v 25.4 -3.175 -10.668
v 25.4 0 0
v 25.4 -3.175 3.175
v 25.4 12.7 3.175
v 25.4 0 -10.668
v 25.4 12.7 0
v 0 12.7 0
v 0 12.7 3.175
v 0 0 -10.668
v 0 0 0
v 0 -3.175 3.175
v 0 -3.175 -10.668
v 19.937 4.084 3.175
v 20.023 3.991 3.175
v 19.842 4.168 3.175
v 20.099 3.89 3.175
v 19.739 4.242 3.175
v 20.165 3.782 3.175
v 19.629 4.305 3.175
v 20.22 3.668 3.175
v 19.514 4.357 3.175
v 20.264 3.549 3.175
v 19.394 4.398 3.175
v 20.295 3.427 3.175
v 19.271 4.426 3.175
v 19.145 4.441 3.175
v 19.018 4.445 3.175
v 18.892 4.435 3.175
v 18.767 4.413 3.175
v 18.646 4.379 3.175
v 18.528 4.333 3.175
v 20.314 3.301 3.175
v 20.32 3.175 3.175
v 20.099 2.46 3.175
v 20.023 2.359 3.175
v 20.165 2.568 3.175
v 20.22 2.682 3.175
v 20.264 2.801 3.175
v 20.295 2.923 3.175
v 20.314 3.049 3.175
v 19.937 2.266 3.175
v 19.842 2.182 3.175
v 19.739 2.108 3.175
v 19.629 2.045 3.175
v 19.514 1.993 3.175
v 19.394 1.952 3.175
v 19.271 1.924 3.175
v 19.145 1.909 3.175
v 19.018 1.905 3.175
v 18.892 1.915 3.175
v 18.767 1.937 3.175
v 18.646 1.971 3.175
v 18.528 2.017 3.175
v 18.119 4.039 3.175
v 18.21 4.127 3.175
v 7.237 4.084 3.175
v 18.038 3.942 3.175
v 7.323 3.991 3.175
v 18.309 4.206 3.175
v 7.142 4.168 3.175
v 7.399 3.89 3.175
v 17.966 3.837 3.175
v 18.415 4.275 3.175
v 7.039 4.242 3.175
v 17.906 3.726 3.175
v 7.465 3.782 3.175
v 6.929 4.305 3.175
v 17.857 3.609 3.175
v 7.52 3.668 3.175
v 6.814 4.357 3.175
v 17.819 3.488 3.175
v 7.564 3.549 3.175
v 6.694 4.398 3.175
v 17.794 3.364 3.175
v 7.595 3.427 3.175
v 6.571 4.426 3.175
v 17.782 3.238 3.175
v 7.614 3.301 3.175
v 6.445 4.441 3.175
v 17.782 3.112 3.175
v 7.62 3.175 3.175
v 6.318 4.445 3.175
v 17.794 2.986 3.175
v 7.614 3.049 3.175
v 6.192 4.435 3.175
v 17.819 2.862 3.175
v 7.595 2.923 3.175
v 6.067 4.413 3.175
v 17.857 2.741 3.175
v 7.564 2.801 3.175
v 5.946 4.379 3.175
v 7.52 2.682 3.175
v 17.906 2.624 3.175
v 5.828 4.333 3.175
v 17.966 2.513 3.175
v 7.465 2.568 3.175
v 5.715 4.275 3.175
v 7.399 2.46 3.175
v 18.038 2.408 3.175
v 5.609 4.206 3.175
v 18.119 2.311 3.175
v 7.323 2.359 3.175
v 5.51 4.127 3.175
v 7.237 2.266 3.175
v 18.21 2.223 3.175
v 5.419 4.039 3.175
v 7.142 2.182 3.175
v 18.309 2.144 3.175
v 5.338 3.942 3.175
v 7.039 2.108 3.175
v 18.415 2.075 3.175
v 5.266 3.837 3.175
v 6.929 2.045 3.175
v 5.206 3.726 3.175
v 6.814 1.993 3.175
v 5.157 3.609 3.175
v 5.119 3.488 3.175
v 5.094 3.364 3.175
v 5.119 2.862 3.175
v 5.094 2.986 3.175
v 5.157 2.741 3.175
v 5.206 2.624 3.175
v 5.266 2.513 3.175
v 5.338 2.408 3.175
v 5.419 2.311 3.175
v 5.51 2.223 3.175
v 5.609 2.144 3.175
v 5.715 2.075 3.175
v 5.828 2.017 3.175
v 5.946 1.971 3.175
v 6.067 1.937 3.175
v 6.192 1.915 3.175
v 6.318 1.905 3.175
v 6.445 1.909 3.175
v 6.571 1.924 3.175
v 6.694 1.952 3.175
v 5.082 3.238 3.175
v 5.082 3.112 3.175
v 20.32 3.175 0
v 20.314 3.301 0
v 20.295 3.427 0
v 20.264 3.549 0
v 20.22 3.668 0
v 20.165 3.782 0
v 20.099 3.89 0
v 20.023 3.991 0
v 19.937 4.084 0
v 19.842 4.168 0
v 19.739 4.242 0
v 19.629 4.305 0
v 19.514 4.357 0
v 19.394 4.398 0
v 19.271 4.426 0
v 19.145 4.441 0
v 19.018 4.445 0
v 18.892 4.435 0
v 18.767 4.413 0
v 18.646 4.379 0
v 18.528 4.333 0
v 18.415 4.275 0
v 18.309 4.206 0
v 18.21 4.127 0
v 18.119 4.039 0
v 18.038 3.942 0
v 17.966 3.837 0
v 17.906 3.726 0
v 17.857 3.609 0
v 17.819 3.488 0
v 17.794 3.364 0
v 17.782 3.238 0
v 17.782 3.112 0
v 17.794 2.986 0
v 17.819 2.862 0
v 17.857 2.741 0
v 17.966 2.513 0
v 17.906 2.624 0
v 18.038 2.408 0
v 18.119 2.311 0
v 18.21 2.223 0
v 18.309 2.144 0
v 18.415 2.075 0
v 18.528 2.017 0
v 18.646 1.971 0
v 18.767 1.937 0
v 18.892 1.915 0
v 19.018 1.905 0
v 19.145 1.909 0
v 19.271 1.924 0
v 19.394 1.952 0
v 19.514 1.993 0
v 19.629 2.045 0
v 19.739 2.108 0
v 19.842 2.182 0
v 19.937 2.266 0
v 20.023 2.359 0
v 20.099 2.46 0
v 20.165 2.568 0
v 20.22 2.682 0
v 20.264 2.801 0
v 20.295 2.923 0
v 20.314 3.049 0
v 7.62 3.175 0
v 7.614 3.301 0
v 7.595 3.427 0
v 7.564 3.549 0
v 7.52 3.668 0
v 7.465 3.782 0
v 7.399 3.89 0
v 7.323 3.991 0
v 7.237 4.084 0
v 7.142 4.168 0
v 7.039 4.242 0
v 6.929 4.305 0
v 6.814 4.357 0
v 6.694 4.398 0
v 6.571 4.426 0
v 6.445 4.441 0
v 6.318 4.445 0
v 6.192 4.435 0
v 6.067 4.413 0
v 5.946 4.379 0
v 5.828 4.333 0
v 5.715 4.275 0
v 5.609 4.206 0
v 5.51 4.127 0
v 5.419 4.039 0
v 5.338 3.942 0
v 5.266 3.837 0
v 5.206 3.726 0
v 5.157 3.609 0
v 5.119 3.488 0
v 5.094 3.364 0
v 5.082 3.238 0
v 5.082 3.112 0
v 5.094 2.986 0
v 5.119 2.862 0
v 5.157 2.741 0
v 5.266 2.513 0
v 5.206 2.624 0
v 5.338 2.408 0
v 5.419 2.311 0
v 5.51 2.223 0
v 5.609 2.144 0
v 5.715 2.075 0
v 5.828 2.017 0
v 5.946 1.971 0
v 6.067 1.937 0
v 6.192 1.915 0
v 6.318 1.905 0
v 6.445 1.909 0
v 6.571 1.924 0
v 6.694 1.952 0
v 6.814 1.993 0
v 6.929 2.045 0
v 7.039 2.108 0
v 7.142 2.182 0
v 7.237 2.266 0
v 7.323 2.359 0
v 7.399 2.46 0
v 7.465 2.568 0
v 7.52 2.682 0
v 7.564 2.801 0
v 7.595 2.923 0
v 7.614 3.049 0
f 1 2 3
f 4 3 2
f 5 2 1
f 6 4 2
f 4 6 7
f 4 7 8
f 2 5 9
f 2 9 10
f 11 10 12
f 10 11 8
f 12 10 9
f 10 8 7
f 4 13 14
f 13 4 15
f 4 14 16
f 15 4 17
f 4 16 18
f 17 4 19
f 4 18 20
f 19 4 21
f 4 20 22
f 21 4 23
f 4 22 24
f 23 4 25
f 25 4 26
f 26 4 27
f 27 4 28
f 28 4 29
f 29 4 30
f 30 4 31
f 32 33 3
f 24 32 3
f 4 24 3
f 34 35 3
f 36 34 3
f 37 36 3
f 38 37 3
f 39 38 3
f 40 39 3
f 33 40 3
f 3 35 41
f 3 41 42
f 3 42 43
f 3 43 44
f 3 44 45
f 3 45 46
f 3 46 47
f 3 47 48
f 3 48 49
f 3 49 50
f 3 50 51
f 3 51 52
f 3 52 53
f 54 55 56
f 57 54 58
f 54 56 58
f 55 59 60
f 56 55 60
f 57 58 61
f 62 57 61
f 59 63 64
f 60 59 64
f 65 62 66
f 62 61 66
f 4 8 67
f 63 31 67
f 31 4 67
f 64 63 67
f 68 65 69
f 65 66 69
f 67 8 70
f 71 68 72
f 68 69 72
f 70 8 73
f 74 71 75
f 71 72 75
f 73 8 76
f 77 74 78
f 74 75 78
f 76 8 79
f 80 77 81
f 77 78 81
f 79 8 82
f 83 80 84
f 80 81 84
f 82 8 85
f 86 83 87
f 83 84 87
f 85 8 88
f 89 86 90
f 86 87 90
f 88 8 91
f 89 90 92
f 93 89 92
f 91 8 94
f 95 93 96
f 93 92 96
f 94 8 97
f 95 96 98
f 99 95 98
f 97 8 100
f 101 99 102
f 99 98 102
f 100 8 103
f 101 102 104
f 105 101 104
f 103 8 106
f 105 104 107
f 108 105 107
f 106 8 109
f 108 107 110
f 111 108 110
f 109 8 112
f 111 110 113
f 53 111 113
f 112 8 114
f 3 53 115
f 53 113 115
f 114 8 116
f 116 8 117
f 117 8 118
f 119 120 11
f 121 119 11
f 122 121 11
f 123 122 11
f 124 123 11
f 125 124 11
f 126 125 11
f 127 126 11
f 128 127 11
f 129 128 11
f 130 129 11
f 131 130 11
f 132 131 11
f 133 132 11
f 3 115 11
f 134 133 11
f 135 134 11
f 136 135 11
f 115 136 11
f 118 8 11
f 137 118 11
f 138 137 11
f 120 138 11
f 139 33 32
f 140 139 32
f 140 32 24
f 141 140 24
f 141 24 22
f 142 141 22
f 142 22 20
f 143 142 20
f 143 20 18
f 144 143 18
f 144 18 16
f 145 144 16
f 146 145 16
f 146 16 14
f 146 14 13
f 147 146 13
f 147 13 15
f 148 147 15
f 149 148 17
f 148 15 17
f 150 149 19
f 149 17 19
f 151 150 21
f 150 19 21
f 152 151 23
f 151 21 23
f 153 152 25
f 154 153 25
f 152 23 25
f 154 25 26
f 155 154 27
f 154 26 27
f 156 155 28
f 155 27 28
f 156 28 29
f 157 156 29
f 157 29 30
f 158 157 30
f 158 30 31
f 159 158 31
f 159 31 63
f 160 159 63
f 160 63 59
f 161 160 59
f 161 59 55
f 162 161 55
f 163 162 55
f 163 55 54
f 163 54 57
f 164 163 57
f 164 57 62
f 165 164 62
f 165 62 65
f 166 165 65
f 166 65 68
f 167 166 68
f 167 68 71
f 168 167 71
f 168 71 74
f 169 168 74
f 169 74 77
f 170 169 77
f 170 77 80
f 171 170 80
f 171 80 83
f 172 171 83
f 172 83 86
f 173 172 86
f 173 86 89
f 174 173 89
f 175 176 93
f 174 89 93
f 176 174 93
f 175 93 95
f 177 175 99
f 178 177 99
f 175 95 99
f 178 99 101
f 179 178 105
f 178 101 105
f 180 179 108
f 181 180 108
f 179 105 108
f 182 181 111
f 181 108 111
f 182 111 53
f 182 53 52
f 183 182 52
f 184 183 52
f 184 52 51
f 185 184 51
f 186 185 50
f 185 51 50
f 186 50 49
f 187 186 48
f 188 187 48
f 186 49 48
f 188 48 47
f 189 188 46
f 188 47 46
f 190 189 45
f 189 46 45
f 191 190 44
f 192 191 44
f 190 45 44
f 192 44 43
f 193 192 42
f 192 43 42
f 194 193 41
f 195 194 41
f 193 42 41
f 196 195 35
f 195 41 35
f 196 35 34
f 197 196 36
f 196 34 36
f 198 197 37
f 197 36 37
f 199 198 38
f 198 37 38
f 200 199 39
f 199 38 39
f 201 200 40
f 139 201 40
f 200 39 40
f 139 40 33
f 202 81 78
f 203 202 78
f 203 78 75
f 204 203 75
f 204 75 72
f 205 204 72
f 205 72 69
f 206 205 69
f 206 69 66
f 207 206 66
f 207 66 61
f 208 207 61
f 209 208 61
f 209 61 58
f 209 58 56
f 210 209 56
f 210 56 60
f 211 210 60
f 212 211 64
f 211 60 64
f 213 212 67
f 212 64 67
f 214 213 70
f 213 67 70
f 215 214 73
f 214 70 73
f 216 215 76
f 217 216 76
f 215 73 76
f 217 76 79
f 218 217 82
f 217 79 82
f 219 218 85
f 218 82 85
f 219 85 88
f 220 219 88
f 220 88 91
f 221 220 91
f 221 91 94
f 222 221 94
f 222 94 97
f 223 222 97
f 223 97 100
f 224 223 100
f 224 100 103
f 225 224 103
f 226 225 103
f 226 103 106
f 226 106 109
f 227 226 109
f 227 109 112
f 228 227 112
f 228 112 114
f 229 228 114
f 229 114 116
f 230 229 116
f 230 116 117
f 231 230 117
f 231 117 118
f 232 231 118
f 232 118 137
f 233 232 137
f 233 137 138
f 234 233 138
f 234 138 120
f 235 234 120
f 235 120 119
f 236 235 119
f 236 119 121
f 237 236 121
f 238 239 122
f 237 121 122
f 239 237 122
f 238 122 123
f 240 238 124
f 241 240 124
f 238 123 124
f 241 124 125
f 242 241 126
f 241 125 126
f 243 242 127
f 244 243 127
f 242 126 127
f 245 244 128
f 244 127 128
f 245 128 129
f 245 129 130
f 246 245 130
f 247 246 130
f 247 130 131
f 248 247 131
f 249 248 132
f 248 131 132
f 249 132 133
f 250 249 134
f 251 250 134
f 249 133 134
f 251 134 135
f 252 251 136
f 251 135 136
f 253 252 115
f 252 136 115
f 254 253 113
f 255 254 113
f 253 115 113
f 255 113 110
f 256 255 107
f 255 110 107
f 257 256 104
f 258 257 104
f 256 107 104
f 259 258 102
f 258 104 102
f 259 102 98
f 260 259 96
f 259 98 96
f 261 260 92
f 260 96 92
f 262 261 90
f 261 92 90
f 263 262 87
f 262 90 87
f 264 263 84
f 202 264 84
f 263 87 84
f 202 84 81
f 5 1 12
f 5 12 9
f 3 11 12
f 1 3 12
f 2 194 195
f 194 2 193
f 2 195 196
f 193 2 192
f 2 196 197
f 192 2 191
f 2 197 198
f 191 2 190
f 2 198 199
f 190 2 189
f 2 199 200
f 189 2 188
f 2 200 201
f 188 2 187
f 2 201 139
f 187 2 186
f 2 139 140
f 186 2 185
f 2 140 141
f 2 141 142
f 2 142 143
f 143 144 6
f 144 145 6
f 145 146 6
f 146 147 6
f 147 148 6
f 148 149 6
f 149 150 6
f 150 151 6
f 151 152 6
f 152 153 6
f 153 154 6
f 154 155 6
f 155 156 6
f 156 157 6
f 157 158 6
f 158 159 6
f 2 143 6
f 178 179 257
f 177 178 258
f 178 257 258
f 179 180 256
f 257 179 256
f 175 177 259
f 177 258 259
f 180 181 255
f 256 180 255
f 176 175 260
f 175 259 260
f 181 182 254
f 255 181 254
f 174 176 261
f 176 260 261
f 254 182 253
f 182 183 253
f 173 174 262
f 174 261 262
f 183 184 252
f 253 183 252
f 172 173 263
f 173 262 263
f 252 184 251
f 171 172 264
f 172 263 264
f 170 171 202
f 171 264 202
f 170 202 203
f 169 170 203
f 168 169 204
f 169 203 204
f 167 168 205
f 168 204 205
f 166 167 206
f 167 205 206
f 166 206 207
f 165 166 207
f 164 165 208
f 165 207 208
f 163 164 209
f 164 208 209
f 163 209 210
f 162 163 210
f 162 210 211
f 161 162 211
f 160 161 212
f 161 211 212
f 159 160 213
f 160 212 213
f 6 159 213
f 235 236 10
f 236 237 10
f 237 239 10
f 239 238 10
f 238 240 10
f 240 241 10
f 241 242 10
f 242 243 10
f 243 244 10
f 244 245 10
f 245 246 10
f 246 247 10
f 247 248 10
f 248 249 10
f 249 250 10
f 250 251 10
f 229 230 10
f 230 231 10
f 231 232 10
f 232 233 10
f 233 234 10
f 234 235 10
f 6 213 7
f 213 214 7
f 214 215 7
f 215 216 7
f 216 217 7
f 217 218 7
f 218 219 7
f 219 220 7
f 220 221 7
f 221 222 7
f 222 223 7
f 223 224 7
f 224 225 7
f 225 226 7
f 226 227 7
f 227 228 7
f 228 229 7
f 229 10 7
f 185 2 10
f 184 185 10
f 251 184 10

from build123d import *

# Parameters (mm, degrees)
BOSS_EXTRUDE1_DEPTH = 25.4
SKETCH2_R           = 1.27
CUT_EXTRUDE1_DEPTH  = 25.4


with BuildPart() as part:
    # Sketch1 → Boss-Extrude1 (new body)
    with BuildSketch(Plane(origin=(0, 0, 0), x_dir=(0, 0, -1), z_dir=(1, 0, 0))):
        Polygon((0, 0), (0, 12.7), (-3.175, 12.7), (-3.175, -3.175), (10.668, -3.175), (10.668, 0), align=None)
    extrude(amount=BOSS_EXTRUDE1_DEPTH)

    # Sketch2 → Cut-Extrude1 (cut)
    with BuildSketch(Plane.XY.offset(3.175)):
        with Locations((6.35, 3.175)):
            Circle(SKETCH2_R)
        with Locations((19.05, 3.175)):
            Circle(SKETCH2_R)
    extrude(amount=-CUT_EXTRUDE1_DEPTH, mode=Mode.SUBTRACT)


solid = part.part
